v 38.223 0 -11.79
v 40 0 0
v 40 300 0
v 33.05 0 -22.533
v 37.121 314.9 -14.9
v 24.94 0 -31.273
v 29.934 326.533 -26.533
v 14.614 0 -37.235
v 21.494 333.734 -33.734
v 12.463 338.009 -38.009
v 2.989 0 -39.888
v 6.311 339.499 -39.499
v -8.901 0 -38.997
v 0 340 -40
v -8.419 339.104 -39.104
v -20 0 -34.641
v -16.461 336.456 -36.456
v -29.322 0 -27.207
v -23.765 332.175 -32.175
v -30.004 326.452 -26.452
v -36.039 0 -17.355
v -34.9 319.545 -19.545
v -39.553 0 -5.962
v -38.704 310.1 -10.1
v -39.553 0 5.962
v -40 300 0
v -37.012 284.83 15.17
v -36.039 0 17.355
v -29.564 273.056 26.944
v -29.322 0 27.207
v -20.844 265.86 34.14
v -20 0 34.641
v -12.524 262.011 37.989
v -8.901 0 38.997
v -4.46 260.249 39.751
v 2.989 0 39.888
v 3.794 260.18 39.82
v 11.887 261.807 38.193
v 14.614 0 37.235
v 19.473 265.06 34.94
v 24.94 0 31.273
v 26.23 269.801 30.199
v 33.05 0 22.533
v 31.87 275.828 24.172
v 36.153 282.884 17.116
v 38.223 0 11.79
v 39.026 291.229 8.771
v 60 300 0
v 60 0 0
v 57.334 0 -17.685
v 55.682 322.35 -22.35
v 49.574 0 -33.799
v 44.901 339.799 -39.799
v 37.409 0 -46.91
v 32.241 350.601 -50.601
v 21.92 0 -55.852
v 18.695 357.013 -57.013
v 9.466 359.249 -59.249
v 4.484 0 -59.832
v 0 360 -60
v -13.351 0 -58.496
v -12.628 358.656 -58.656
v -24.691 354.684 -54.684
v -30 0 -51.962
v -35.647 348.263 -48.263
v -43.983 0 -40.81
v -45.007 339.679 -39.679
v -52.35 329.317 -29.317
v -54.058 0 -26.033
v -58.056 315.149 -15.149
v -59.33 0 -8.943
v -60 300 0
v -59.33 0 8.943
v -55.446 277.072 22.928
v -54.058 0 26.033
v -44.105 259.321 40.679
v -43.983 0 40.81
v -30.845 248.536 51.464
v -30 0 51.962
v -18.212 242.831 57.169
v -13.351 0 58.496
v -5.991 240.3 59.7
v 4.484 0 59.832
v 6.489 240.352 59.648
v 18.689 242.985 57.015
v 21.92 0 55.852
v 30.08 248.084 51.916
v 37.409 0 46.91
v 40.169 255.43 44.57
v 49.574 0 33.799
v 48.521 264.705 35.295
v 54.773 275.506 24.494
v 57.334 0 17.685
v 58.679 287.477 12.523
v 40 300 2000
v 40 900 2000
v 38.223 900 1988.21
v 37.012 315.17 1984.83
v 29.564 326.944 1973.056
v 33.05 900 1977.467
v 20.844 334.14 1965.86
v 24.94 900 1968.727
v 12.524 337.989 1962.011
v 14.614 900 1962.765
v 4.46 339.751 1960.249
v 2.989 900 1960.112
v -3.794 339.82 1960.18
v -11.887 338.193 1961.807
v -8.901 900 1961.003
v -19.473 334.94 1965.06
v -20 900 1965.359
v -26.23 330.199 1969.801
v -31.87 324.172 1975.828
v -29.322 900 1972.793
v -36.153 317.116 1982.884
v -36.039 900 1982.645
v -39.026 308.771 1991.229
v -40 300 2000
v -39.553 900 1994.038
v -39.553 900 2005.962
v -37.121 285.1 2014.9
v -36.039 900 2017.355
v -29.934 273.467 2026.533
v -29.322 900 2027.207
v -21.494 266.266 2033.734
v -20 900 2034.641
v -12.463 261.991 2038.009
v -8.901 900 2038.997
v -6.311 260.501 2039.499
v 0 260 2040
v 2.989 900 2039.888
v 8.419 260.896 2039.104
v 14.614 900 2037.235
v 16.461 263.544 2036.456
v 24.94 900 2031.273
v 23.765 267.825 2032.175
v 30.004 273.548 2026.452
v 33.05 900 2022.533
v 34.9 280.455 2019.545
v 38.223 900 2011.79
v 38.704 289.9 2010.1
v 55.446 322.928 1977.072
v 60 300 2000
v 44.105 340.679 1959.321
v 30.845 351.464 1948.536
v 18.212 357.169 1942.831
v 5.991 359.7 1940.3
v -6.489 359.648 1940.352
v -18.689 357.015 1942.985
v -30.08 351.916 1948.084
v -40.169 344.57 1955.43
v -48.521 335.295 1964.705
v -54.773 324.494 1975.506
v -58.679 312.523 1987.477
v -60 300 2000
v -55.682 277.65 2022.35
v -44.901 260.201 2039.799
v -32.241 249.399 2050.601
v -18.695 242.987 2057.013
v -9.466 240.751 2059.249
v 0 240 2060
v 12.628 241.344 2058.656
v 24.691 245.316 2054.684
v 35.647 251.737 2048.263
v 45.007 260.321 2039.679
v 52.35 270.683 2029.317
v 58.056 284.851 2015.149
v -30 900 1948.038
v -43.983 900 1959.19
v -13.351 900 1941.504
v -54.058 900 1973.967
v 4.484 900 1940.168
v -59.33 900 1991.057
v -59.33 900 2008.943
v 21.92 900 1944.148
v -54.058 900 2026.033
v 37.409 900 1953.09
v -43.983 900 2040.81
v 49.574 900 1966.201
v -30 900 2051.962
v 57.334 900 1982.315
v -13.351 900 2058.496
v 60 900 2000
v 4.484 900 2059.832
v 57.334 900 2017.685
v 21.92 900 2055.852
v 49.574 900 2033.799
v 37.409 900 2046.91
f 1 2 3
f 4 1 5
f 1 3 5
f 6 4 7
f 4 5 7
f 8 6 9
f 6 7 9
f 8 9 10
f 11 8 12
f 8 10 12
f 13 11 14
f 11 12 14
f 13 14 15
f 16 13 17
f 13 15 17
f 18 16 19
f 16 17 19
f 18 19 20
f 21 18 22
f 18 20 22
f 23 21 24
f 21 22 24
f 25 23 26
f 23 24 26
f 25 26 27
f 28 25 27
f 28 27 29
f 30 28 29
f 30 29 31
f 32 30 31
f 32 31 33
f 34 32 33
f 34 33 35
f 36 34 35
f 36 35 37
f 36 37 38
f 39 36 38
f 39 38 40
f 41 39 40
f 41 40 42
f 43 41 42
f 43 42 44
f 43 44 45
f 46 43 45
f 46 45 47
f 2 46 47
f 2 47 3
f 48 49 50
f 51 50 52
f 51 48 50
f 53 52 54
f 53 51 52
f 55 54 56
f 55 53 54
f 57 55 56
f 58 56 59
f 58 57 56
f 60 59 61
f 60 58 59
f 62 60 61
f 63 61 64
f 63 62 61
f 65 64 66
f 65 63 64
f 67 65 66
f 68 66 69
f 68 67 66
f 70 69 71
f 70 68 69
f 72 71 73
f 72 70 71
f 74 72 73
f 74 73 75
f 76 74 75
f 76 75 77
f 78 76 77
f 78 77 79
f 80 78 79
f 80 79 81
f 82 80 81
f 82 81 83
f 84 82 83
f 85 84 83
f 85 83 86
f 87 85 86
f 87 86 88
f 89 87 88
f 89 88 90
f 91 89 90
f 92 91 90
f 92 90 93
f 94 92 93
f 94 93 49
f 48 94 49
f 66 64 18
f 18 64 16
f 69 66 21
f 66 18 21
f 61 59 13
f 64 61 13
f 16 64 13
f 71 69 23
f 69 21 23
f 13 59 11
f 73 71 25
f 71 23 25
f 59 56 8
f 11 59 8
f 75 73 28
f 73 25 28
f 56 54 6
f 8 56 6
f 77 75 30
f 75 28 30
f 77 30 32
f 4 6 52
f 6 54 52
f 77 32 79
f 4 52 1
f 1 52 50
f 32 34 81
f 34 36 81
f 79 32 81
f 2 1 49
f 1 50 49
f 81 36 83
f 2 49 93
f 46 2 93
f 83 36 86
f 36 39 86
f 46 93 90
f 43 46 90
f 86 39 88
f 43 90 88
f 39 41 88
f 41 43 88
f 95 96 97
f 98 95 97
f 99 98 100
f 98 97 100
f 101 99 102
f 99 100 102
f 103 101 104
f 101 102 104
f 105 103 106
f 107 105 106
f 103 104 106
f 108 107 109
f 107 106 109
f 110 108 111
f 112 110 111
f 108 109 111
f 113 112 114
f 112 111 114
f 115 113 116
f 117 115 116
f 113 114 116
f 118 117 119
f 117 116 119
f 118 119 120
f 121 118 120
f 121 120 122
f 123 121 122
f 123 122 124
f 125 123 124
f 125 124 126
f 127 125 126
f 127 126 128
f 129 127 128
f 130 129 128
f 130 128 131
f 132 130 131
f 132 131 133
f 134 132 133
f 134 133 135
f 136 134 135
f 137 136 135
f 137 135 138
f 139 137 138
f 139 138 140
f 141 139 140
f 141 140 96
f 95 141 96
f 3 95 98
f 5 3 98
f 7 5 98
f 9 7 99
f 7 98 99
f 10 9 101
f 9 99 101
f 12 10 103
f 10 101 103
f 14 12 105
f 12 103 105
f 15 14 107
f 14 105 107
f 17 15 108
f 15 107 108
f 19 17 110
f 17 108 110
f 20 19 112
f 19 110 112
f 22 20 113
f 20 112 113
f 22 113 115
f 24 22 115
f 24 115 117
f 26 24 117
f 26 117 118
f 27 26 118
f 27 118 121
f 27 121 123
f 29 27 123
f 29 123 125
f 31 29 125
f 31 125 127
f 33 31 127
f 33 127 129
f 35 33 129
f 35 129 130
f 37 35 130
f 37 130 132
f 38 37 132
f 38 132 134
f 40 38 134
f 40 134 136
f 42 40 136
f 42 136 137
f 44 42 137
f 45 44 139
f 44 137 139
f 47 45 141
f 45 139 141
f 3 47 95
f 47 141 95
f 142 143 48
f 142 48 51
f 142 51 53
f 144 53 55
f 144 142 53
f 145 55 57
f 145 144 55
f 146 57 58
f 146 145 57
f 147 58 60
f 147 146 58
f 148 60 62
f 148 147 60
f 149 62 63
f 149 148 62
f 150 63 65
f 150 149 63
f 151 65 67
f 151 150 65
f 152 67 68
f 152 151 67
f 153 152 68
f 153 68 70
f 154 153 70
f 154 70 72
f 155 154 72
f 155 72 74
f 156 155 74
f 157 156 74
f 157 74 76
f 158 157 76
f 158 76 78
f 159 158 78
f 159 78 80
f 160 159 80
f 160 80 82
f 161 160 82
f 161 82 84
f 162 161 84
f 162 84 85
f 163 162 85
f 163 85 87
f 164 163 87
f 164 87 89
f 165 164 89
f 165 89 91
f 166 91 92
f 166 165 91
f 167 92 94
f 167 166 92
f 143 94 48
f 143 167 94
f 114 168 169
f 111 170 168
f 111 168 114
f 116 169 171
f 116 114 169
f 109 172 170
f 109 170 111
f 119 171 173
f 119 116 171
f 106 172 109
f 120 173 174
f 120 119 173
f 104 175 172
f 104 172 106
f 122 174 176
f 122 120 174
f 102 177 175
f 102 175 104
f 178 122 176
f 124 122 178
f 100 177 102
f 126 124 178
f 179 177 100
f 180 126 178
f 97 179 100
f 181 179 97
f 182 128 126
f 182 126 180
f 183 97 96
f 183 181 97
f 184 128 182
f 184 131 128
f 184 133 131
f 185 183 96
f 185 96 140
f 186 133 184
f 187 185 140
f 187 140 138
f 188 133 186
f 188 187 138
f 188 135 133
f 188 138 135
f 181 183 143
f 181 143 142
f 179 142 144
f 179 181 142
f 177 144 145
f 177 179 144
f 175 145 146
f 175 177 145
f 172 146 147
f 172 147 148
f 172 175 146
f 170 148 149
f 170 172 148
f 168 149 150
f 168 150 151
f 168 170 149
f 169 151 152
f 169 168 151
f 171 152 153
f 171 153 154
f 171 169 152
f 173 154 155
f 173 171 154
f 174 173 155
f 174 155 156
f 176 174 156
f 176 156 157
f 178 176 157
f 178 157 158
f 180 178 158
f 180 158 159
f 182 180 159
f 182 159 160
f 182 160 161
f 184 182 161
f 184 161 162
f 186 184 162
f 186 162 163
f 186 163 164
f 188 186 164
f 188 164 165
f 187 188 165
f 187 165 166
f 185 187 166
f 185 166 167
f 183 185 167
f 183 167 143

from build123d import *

# Parameters (mm, degrees)
SKETCH4_R   = 60
SKETCH4_R_2 = 40


with BuildPart() as part:
    # Sweep1: sweep along a path in Sketch1
    with BuildLine(Plane(origin=(0, 0, 0), x_dir=(0, 0, -1), z_dir=(1, 0, 0))) as sweep1_path:
        Line((0, 0), (0, 300))
        Line((0, 300), (-2000, 300))
        Line((-2000, 300), (-2000, 900))
    # Sketch4 → Sweep1 (sweep)
    with BuildSketch(Plane(origin=(0, 0, 0), x_dir=(1, 0, 0), z_dir=(0, 1, 0))):
        Circle(SKETCH4_R)
        Circle(SKETCH4_R_2, mode=Mode.SUBTRACT)
    sweep(path=sweep1_path.line, transition=Transition.RIGHT)


solid = part.part
